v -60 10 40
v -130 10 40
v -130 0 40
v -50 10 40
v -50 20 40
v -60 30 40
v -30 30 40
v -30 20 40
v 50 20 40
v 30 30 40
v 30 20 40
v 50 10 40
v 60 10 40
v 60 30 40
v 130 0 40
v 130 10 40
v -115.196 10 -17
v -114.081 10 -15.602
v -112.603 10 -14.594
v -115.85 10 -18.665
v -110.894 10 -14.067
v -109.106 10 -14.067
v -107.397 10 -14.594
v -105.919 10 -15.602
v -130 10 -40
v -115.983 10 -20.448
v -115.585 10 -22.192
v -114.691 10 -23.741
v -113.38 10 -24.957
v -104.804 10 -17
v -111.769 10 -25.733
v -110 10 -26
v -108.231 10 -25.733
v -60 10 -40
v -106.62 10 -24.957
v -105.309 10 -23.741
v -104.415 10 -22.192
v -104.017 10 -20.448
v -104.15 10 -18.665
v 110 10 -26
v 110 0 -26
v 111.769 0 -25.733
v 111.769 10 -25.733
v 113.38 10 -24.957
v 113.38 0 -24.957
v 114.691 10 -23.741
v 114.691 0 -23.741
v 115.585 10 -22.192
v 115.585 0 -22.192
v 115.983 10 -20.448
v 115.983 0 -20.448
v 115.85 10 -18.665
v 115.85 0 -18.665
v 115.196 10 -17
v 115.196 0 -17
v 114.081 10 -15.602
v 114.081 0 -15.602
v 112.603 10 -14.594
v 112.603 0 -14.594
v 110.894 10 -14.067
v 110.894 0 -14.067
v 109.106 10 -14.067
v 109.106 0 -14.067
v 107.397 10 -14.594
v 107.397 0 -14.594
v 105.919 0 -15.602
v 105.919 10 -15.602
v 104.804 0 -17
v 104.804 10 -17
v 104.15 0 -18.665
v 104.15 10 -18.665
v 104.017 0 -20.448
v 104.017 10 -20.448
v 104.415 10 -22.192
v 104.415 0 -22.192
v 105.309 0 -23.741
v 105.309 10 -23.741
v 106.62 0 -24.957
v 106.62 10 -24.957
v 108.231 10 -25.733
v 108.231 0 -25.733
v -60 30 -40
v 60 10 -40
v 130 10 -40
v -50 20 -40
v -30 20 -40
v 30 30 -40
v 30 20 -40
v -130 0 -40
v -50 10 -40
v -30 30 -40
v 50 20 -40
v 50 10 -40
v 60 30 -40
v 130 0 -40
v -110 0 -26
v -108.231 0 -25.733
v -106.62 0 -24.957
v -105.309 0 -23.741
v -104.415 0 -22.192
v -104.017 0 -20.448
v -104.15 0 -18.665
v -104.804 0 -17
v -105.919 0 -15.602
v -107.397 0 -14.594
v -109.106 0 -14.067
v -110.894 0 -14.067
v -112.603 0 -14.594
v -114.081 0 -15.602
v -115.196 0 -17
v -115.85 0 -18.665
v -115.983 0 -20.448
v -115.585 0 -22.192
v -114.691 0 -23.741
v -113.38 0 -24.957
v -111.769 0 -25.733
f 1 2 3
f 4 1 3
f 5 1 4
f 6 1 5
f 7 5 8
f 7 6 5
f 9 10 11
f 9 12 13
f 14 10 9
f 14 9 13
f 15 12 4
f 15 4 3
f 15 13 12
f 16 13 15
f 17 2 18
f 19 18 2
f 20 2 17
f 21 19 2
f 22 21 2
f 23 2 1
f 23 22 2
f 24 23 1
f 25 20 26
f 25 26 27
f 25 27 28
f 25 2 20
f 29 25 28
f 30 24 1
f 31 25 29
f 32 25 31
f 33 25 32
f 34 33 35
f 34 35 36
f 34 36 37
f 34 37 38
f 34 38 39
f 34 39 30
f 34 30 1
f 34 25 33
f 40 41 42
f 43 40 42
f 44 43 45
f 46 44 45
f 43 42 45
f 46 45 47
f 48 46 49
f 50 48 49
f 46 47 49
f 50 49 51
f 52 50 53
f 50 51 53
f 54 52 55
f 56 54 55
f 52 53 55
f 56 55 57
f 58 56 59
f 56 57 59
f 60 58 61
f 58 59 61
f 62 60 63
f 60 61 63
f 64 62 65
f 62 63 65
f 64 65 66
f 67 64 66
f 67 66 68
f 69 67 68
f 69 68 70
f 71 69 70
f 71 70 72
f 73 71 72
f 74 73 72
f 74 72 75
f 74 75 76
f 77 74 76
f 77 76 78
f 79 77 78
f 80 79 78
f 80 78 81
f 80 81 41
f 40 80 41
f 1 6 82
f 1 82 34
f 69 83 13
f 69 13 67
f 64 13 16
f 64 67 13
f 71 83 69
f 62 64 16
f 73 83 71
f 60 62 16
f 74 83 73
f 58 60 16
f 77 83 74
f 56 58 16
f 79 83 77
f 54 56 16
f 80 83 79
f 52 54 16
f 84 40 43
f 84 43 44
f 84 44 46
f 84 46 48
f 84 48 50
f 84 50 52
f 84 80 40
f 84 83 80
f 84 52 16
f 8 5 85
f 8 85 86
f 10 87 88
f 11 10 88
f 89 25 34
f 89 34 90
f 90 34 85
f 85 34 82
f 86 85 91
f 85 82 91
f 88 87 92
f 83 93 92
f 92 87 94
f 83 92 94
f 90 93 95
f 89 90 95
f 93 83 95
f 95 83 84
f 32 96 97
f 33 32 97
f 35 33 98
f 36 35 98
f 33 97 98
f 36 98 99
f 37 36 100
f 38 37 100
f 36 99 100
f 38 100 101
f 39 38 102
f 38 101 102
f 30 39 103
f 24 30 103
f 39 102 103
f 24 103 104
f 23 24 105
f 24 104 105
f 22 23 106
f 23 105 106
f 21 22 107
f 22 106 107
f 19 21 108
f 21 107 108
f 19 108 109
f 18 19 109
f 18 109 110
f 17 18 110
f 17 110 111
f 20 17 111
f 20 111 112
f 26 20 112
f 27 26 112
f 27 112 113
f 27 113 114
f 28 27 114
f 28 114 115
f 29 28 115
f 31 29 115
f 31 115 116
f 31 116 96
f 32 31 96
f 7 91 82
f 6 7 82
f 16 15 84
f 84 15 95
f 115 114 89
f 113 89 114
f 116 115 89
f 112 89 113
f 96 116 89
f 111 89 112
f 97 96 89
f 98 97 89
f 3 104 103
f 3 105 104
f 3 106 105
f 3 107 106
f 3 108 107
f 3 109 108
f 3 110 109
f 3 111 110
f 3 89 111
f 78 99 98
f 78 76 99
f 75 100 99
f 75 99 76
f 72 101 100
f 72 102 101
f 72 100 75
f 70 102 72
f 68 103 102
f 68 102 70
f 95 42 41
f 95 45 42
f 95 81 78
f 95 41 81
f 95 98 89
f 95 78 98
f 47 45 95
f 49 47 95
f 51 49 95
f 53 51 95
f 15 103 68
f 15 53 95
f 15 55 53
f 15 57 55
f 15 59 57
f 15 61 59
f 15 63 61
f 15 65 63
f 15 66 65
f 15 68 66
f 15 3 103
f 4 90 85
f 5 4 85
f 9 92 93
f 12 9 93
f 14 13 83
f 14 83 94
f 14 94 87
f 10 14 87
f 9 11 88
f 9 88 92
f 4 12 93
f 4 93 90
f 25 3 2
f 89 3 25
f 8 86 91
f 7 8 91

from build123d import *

# Parameters (mm, degrees)
SKETCH1_W             = 260
SKETCH1_H             = 80
BOSS_EXTRUDE1_DEPTH   = 10
EXTRUDE_THIN2_DEPTH   = 80
F_1_0MM_DOWEL_HOLE1_D = 12


with BuildPart() as part:
    # Sketch1 → Boss-Extrude1 (new body)
    with BuildSketch(Plane(origin=(0, 0, 0), x_dir=(1, 0, 0), z_dir=(0, 1, 0))):
        Rectangle(SKETCH1_W, SKETCH1_H)
    extrude(amount=BOSS_EXTRUDE1_DEPTH)

    # Sketch2 → Extrude-Thin2 (add)
    with BuildSketch(Plane.XY.offset(40)):
        Polygon((-30, 30), (-60, 30), (-60, 0), (60, 0), (60, 30), (30, 30), (30, 20), (50, 20), (50, 10), (-50, 10), (-50, 20), (-30, 20), align=None)
    extrude(amount=-EXTRUDE_THIN2_DEPTH)

    # Ø1.0mm Dowel Hole1 (through all)
    with Locations(Plane(origin=(-110, 10, -20), x_dir=(0, 0, 1), z_dir=(0, 1, 0))):
        with Locations((0, 0), (0, 220)):
            Hole(F_1_0MM_DOWEL_HOLE1_D / 2)


solid = part.part
